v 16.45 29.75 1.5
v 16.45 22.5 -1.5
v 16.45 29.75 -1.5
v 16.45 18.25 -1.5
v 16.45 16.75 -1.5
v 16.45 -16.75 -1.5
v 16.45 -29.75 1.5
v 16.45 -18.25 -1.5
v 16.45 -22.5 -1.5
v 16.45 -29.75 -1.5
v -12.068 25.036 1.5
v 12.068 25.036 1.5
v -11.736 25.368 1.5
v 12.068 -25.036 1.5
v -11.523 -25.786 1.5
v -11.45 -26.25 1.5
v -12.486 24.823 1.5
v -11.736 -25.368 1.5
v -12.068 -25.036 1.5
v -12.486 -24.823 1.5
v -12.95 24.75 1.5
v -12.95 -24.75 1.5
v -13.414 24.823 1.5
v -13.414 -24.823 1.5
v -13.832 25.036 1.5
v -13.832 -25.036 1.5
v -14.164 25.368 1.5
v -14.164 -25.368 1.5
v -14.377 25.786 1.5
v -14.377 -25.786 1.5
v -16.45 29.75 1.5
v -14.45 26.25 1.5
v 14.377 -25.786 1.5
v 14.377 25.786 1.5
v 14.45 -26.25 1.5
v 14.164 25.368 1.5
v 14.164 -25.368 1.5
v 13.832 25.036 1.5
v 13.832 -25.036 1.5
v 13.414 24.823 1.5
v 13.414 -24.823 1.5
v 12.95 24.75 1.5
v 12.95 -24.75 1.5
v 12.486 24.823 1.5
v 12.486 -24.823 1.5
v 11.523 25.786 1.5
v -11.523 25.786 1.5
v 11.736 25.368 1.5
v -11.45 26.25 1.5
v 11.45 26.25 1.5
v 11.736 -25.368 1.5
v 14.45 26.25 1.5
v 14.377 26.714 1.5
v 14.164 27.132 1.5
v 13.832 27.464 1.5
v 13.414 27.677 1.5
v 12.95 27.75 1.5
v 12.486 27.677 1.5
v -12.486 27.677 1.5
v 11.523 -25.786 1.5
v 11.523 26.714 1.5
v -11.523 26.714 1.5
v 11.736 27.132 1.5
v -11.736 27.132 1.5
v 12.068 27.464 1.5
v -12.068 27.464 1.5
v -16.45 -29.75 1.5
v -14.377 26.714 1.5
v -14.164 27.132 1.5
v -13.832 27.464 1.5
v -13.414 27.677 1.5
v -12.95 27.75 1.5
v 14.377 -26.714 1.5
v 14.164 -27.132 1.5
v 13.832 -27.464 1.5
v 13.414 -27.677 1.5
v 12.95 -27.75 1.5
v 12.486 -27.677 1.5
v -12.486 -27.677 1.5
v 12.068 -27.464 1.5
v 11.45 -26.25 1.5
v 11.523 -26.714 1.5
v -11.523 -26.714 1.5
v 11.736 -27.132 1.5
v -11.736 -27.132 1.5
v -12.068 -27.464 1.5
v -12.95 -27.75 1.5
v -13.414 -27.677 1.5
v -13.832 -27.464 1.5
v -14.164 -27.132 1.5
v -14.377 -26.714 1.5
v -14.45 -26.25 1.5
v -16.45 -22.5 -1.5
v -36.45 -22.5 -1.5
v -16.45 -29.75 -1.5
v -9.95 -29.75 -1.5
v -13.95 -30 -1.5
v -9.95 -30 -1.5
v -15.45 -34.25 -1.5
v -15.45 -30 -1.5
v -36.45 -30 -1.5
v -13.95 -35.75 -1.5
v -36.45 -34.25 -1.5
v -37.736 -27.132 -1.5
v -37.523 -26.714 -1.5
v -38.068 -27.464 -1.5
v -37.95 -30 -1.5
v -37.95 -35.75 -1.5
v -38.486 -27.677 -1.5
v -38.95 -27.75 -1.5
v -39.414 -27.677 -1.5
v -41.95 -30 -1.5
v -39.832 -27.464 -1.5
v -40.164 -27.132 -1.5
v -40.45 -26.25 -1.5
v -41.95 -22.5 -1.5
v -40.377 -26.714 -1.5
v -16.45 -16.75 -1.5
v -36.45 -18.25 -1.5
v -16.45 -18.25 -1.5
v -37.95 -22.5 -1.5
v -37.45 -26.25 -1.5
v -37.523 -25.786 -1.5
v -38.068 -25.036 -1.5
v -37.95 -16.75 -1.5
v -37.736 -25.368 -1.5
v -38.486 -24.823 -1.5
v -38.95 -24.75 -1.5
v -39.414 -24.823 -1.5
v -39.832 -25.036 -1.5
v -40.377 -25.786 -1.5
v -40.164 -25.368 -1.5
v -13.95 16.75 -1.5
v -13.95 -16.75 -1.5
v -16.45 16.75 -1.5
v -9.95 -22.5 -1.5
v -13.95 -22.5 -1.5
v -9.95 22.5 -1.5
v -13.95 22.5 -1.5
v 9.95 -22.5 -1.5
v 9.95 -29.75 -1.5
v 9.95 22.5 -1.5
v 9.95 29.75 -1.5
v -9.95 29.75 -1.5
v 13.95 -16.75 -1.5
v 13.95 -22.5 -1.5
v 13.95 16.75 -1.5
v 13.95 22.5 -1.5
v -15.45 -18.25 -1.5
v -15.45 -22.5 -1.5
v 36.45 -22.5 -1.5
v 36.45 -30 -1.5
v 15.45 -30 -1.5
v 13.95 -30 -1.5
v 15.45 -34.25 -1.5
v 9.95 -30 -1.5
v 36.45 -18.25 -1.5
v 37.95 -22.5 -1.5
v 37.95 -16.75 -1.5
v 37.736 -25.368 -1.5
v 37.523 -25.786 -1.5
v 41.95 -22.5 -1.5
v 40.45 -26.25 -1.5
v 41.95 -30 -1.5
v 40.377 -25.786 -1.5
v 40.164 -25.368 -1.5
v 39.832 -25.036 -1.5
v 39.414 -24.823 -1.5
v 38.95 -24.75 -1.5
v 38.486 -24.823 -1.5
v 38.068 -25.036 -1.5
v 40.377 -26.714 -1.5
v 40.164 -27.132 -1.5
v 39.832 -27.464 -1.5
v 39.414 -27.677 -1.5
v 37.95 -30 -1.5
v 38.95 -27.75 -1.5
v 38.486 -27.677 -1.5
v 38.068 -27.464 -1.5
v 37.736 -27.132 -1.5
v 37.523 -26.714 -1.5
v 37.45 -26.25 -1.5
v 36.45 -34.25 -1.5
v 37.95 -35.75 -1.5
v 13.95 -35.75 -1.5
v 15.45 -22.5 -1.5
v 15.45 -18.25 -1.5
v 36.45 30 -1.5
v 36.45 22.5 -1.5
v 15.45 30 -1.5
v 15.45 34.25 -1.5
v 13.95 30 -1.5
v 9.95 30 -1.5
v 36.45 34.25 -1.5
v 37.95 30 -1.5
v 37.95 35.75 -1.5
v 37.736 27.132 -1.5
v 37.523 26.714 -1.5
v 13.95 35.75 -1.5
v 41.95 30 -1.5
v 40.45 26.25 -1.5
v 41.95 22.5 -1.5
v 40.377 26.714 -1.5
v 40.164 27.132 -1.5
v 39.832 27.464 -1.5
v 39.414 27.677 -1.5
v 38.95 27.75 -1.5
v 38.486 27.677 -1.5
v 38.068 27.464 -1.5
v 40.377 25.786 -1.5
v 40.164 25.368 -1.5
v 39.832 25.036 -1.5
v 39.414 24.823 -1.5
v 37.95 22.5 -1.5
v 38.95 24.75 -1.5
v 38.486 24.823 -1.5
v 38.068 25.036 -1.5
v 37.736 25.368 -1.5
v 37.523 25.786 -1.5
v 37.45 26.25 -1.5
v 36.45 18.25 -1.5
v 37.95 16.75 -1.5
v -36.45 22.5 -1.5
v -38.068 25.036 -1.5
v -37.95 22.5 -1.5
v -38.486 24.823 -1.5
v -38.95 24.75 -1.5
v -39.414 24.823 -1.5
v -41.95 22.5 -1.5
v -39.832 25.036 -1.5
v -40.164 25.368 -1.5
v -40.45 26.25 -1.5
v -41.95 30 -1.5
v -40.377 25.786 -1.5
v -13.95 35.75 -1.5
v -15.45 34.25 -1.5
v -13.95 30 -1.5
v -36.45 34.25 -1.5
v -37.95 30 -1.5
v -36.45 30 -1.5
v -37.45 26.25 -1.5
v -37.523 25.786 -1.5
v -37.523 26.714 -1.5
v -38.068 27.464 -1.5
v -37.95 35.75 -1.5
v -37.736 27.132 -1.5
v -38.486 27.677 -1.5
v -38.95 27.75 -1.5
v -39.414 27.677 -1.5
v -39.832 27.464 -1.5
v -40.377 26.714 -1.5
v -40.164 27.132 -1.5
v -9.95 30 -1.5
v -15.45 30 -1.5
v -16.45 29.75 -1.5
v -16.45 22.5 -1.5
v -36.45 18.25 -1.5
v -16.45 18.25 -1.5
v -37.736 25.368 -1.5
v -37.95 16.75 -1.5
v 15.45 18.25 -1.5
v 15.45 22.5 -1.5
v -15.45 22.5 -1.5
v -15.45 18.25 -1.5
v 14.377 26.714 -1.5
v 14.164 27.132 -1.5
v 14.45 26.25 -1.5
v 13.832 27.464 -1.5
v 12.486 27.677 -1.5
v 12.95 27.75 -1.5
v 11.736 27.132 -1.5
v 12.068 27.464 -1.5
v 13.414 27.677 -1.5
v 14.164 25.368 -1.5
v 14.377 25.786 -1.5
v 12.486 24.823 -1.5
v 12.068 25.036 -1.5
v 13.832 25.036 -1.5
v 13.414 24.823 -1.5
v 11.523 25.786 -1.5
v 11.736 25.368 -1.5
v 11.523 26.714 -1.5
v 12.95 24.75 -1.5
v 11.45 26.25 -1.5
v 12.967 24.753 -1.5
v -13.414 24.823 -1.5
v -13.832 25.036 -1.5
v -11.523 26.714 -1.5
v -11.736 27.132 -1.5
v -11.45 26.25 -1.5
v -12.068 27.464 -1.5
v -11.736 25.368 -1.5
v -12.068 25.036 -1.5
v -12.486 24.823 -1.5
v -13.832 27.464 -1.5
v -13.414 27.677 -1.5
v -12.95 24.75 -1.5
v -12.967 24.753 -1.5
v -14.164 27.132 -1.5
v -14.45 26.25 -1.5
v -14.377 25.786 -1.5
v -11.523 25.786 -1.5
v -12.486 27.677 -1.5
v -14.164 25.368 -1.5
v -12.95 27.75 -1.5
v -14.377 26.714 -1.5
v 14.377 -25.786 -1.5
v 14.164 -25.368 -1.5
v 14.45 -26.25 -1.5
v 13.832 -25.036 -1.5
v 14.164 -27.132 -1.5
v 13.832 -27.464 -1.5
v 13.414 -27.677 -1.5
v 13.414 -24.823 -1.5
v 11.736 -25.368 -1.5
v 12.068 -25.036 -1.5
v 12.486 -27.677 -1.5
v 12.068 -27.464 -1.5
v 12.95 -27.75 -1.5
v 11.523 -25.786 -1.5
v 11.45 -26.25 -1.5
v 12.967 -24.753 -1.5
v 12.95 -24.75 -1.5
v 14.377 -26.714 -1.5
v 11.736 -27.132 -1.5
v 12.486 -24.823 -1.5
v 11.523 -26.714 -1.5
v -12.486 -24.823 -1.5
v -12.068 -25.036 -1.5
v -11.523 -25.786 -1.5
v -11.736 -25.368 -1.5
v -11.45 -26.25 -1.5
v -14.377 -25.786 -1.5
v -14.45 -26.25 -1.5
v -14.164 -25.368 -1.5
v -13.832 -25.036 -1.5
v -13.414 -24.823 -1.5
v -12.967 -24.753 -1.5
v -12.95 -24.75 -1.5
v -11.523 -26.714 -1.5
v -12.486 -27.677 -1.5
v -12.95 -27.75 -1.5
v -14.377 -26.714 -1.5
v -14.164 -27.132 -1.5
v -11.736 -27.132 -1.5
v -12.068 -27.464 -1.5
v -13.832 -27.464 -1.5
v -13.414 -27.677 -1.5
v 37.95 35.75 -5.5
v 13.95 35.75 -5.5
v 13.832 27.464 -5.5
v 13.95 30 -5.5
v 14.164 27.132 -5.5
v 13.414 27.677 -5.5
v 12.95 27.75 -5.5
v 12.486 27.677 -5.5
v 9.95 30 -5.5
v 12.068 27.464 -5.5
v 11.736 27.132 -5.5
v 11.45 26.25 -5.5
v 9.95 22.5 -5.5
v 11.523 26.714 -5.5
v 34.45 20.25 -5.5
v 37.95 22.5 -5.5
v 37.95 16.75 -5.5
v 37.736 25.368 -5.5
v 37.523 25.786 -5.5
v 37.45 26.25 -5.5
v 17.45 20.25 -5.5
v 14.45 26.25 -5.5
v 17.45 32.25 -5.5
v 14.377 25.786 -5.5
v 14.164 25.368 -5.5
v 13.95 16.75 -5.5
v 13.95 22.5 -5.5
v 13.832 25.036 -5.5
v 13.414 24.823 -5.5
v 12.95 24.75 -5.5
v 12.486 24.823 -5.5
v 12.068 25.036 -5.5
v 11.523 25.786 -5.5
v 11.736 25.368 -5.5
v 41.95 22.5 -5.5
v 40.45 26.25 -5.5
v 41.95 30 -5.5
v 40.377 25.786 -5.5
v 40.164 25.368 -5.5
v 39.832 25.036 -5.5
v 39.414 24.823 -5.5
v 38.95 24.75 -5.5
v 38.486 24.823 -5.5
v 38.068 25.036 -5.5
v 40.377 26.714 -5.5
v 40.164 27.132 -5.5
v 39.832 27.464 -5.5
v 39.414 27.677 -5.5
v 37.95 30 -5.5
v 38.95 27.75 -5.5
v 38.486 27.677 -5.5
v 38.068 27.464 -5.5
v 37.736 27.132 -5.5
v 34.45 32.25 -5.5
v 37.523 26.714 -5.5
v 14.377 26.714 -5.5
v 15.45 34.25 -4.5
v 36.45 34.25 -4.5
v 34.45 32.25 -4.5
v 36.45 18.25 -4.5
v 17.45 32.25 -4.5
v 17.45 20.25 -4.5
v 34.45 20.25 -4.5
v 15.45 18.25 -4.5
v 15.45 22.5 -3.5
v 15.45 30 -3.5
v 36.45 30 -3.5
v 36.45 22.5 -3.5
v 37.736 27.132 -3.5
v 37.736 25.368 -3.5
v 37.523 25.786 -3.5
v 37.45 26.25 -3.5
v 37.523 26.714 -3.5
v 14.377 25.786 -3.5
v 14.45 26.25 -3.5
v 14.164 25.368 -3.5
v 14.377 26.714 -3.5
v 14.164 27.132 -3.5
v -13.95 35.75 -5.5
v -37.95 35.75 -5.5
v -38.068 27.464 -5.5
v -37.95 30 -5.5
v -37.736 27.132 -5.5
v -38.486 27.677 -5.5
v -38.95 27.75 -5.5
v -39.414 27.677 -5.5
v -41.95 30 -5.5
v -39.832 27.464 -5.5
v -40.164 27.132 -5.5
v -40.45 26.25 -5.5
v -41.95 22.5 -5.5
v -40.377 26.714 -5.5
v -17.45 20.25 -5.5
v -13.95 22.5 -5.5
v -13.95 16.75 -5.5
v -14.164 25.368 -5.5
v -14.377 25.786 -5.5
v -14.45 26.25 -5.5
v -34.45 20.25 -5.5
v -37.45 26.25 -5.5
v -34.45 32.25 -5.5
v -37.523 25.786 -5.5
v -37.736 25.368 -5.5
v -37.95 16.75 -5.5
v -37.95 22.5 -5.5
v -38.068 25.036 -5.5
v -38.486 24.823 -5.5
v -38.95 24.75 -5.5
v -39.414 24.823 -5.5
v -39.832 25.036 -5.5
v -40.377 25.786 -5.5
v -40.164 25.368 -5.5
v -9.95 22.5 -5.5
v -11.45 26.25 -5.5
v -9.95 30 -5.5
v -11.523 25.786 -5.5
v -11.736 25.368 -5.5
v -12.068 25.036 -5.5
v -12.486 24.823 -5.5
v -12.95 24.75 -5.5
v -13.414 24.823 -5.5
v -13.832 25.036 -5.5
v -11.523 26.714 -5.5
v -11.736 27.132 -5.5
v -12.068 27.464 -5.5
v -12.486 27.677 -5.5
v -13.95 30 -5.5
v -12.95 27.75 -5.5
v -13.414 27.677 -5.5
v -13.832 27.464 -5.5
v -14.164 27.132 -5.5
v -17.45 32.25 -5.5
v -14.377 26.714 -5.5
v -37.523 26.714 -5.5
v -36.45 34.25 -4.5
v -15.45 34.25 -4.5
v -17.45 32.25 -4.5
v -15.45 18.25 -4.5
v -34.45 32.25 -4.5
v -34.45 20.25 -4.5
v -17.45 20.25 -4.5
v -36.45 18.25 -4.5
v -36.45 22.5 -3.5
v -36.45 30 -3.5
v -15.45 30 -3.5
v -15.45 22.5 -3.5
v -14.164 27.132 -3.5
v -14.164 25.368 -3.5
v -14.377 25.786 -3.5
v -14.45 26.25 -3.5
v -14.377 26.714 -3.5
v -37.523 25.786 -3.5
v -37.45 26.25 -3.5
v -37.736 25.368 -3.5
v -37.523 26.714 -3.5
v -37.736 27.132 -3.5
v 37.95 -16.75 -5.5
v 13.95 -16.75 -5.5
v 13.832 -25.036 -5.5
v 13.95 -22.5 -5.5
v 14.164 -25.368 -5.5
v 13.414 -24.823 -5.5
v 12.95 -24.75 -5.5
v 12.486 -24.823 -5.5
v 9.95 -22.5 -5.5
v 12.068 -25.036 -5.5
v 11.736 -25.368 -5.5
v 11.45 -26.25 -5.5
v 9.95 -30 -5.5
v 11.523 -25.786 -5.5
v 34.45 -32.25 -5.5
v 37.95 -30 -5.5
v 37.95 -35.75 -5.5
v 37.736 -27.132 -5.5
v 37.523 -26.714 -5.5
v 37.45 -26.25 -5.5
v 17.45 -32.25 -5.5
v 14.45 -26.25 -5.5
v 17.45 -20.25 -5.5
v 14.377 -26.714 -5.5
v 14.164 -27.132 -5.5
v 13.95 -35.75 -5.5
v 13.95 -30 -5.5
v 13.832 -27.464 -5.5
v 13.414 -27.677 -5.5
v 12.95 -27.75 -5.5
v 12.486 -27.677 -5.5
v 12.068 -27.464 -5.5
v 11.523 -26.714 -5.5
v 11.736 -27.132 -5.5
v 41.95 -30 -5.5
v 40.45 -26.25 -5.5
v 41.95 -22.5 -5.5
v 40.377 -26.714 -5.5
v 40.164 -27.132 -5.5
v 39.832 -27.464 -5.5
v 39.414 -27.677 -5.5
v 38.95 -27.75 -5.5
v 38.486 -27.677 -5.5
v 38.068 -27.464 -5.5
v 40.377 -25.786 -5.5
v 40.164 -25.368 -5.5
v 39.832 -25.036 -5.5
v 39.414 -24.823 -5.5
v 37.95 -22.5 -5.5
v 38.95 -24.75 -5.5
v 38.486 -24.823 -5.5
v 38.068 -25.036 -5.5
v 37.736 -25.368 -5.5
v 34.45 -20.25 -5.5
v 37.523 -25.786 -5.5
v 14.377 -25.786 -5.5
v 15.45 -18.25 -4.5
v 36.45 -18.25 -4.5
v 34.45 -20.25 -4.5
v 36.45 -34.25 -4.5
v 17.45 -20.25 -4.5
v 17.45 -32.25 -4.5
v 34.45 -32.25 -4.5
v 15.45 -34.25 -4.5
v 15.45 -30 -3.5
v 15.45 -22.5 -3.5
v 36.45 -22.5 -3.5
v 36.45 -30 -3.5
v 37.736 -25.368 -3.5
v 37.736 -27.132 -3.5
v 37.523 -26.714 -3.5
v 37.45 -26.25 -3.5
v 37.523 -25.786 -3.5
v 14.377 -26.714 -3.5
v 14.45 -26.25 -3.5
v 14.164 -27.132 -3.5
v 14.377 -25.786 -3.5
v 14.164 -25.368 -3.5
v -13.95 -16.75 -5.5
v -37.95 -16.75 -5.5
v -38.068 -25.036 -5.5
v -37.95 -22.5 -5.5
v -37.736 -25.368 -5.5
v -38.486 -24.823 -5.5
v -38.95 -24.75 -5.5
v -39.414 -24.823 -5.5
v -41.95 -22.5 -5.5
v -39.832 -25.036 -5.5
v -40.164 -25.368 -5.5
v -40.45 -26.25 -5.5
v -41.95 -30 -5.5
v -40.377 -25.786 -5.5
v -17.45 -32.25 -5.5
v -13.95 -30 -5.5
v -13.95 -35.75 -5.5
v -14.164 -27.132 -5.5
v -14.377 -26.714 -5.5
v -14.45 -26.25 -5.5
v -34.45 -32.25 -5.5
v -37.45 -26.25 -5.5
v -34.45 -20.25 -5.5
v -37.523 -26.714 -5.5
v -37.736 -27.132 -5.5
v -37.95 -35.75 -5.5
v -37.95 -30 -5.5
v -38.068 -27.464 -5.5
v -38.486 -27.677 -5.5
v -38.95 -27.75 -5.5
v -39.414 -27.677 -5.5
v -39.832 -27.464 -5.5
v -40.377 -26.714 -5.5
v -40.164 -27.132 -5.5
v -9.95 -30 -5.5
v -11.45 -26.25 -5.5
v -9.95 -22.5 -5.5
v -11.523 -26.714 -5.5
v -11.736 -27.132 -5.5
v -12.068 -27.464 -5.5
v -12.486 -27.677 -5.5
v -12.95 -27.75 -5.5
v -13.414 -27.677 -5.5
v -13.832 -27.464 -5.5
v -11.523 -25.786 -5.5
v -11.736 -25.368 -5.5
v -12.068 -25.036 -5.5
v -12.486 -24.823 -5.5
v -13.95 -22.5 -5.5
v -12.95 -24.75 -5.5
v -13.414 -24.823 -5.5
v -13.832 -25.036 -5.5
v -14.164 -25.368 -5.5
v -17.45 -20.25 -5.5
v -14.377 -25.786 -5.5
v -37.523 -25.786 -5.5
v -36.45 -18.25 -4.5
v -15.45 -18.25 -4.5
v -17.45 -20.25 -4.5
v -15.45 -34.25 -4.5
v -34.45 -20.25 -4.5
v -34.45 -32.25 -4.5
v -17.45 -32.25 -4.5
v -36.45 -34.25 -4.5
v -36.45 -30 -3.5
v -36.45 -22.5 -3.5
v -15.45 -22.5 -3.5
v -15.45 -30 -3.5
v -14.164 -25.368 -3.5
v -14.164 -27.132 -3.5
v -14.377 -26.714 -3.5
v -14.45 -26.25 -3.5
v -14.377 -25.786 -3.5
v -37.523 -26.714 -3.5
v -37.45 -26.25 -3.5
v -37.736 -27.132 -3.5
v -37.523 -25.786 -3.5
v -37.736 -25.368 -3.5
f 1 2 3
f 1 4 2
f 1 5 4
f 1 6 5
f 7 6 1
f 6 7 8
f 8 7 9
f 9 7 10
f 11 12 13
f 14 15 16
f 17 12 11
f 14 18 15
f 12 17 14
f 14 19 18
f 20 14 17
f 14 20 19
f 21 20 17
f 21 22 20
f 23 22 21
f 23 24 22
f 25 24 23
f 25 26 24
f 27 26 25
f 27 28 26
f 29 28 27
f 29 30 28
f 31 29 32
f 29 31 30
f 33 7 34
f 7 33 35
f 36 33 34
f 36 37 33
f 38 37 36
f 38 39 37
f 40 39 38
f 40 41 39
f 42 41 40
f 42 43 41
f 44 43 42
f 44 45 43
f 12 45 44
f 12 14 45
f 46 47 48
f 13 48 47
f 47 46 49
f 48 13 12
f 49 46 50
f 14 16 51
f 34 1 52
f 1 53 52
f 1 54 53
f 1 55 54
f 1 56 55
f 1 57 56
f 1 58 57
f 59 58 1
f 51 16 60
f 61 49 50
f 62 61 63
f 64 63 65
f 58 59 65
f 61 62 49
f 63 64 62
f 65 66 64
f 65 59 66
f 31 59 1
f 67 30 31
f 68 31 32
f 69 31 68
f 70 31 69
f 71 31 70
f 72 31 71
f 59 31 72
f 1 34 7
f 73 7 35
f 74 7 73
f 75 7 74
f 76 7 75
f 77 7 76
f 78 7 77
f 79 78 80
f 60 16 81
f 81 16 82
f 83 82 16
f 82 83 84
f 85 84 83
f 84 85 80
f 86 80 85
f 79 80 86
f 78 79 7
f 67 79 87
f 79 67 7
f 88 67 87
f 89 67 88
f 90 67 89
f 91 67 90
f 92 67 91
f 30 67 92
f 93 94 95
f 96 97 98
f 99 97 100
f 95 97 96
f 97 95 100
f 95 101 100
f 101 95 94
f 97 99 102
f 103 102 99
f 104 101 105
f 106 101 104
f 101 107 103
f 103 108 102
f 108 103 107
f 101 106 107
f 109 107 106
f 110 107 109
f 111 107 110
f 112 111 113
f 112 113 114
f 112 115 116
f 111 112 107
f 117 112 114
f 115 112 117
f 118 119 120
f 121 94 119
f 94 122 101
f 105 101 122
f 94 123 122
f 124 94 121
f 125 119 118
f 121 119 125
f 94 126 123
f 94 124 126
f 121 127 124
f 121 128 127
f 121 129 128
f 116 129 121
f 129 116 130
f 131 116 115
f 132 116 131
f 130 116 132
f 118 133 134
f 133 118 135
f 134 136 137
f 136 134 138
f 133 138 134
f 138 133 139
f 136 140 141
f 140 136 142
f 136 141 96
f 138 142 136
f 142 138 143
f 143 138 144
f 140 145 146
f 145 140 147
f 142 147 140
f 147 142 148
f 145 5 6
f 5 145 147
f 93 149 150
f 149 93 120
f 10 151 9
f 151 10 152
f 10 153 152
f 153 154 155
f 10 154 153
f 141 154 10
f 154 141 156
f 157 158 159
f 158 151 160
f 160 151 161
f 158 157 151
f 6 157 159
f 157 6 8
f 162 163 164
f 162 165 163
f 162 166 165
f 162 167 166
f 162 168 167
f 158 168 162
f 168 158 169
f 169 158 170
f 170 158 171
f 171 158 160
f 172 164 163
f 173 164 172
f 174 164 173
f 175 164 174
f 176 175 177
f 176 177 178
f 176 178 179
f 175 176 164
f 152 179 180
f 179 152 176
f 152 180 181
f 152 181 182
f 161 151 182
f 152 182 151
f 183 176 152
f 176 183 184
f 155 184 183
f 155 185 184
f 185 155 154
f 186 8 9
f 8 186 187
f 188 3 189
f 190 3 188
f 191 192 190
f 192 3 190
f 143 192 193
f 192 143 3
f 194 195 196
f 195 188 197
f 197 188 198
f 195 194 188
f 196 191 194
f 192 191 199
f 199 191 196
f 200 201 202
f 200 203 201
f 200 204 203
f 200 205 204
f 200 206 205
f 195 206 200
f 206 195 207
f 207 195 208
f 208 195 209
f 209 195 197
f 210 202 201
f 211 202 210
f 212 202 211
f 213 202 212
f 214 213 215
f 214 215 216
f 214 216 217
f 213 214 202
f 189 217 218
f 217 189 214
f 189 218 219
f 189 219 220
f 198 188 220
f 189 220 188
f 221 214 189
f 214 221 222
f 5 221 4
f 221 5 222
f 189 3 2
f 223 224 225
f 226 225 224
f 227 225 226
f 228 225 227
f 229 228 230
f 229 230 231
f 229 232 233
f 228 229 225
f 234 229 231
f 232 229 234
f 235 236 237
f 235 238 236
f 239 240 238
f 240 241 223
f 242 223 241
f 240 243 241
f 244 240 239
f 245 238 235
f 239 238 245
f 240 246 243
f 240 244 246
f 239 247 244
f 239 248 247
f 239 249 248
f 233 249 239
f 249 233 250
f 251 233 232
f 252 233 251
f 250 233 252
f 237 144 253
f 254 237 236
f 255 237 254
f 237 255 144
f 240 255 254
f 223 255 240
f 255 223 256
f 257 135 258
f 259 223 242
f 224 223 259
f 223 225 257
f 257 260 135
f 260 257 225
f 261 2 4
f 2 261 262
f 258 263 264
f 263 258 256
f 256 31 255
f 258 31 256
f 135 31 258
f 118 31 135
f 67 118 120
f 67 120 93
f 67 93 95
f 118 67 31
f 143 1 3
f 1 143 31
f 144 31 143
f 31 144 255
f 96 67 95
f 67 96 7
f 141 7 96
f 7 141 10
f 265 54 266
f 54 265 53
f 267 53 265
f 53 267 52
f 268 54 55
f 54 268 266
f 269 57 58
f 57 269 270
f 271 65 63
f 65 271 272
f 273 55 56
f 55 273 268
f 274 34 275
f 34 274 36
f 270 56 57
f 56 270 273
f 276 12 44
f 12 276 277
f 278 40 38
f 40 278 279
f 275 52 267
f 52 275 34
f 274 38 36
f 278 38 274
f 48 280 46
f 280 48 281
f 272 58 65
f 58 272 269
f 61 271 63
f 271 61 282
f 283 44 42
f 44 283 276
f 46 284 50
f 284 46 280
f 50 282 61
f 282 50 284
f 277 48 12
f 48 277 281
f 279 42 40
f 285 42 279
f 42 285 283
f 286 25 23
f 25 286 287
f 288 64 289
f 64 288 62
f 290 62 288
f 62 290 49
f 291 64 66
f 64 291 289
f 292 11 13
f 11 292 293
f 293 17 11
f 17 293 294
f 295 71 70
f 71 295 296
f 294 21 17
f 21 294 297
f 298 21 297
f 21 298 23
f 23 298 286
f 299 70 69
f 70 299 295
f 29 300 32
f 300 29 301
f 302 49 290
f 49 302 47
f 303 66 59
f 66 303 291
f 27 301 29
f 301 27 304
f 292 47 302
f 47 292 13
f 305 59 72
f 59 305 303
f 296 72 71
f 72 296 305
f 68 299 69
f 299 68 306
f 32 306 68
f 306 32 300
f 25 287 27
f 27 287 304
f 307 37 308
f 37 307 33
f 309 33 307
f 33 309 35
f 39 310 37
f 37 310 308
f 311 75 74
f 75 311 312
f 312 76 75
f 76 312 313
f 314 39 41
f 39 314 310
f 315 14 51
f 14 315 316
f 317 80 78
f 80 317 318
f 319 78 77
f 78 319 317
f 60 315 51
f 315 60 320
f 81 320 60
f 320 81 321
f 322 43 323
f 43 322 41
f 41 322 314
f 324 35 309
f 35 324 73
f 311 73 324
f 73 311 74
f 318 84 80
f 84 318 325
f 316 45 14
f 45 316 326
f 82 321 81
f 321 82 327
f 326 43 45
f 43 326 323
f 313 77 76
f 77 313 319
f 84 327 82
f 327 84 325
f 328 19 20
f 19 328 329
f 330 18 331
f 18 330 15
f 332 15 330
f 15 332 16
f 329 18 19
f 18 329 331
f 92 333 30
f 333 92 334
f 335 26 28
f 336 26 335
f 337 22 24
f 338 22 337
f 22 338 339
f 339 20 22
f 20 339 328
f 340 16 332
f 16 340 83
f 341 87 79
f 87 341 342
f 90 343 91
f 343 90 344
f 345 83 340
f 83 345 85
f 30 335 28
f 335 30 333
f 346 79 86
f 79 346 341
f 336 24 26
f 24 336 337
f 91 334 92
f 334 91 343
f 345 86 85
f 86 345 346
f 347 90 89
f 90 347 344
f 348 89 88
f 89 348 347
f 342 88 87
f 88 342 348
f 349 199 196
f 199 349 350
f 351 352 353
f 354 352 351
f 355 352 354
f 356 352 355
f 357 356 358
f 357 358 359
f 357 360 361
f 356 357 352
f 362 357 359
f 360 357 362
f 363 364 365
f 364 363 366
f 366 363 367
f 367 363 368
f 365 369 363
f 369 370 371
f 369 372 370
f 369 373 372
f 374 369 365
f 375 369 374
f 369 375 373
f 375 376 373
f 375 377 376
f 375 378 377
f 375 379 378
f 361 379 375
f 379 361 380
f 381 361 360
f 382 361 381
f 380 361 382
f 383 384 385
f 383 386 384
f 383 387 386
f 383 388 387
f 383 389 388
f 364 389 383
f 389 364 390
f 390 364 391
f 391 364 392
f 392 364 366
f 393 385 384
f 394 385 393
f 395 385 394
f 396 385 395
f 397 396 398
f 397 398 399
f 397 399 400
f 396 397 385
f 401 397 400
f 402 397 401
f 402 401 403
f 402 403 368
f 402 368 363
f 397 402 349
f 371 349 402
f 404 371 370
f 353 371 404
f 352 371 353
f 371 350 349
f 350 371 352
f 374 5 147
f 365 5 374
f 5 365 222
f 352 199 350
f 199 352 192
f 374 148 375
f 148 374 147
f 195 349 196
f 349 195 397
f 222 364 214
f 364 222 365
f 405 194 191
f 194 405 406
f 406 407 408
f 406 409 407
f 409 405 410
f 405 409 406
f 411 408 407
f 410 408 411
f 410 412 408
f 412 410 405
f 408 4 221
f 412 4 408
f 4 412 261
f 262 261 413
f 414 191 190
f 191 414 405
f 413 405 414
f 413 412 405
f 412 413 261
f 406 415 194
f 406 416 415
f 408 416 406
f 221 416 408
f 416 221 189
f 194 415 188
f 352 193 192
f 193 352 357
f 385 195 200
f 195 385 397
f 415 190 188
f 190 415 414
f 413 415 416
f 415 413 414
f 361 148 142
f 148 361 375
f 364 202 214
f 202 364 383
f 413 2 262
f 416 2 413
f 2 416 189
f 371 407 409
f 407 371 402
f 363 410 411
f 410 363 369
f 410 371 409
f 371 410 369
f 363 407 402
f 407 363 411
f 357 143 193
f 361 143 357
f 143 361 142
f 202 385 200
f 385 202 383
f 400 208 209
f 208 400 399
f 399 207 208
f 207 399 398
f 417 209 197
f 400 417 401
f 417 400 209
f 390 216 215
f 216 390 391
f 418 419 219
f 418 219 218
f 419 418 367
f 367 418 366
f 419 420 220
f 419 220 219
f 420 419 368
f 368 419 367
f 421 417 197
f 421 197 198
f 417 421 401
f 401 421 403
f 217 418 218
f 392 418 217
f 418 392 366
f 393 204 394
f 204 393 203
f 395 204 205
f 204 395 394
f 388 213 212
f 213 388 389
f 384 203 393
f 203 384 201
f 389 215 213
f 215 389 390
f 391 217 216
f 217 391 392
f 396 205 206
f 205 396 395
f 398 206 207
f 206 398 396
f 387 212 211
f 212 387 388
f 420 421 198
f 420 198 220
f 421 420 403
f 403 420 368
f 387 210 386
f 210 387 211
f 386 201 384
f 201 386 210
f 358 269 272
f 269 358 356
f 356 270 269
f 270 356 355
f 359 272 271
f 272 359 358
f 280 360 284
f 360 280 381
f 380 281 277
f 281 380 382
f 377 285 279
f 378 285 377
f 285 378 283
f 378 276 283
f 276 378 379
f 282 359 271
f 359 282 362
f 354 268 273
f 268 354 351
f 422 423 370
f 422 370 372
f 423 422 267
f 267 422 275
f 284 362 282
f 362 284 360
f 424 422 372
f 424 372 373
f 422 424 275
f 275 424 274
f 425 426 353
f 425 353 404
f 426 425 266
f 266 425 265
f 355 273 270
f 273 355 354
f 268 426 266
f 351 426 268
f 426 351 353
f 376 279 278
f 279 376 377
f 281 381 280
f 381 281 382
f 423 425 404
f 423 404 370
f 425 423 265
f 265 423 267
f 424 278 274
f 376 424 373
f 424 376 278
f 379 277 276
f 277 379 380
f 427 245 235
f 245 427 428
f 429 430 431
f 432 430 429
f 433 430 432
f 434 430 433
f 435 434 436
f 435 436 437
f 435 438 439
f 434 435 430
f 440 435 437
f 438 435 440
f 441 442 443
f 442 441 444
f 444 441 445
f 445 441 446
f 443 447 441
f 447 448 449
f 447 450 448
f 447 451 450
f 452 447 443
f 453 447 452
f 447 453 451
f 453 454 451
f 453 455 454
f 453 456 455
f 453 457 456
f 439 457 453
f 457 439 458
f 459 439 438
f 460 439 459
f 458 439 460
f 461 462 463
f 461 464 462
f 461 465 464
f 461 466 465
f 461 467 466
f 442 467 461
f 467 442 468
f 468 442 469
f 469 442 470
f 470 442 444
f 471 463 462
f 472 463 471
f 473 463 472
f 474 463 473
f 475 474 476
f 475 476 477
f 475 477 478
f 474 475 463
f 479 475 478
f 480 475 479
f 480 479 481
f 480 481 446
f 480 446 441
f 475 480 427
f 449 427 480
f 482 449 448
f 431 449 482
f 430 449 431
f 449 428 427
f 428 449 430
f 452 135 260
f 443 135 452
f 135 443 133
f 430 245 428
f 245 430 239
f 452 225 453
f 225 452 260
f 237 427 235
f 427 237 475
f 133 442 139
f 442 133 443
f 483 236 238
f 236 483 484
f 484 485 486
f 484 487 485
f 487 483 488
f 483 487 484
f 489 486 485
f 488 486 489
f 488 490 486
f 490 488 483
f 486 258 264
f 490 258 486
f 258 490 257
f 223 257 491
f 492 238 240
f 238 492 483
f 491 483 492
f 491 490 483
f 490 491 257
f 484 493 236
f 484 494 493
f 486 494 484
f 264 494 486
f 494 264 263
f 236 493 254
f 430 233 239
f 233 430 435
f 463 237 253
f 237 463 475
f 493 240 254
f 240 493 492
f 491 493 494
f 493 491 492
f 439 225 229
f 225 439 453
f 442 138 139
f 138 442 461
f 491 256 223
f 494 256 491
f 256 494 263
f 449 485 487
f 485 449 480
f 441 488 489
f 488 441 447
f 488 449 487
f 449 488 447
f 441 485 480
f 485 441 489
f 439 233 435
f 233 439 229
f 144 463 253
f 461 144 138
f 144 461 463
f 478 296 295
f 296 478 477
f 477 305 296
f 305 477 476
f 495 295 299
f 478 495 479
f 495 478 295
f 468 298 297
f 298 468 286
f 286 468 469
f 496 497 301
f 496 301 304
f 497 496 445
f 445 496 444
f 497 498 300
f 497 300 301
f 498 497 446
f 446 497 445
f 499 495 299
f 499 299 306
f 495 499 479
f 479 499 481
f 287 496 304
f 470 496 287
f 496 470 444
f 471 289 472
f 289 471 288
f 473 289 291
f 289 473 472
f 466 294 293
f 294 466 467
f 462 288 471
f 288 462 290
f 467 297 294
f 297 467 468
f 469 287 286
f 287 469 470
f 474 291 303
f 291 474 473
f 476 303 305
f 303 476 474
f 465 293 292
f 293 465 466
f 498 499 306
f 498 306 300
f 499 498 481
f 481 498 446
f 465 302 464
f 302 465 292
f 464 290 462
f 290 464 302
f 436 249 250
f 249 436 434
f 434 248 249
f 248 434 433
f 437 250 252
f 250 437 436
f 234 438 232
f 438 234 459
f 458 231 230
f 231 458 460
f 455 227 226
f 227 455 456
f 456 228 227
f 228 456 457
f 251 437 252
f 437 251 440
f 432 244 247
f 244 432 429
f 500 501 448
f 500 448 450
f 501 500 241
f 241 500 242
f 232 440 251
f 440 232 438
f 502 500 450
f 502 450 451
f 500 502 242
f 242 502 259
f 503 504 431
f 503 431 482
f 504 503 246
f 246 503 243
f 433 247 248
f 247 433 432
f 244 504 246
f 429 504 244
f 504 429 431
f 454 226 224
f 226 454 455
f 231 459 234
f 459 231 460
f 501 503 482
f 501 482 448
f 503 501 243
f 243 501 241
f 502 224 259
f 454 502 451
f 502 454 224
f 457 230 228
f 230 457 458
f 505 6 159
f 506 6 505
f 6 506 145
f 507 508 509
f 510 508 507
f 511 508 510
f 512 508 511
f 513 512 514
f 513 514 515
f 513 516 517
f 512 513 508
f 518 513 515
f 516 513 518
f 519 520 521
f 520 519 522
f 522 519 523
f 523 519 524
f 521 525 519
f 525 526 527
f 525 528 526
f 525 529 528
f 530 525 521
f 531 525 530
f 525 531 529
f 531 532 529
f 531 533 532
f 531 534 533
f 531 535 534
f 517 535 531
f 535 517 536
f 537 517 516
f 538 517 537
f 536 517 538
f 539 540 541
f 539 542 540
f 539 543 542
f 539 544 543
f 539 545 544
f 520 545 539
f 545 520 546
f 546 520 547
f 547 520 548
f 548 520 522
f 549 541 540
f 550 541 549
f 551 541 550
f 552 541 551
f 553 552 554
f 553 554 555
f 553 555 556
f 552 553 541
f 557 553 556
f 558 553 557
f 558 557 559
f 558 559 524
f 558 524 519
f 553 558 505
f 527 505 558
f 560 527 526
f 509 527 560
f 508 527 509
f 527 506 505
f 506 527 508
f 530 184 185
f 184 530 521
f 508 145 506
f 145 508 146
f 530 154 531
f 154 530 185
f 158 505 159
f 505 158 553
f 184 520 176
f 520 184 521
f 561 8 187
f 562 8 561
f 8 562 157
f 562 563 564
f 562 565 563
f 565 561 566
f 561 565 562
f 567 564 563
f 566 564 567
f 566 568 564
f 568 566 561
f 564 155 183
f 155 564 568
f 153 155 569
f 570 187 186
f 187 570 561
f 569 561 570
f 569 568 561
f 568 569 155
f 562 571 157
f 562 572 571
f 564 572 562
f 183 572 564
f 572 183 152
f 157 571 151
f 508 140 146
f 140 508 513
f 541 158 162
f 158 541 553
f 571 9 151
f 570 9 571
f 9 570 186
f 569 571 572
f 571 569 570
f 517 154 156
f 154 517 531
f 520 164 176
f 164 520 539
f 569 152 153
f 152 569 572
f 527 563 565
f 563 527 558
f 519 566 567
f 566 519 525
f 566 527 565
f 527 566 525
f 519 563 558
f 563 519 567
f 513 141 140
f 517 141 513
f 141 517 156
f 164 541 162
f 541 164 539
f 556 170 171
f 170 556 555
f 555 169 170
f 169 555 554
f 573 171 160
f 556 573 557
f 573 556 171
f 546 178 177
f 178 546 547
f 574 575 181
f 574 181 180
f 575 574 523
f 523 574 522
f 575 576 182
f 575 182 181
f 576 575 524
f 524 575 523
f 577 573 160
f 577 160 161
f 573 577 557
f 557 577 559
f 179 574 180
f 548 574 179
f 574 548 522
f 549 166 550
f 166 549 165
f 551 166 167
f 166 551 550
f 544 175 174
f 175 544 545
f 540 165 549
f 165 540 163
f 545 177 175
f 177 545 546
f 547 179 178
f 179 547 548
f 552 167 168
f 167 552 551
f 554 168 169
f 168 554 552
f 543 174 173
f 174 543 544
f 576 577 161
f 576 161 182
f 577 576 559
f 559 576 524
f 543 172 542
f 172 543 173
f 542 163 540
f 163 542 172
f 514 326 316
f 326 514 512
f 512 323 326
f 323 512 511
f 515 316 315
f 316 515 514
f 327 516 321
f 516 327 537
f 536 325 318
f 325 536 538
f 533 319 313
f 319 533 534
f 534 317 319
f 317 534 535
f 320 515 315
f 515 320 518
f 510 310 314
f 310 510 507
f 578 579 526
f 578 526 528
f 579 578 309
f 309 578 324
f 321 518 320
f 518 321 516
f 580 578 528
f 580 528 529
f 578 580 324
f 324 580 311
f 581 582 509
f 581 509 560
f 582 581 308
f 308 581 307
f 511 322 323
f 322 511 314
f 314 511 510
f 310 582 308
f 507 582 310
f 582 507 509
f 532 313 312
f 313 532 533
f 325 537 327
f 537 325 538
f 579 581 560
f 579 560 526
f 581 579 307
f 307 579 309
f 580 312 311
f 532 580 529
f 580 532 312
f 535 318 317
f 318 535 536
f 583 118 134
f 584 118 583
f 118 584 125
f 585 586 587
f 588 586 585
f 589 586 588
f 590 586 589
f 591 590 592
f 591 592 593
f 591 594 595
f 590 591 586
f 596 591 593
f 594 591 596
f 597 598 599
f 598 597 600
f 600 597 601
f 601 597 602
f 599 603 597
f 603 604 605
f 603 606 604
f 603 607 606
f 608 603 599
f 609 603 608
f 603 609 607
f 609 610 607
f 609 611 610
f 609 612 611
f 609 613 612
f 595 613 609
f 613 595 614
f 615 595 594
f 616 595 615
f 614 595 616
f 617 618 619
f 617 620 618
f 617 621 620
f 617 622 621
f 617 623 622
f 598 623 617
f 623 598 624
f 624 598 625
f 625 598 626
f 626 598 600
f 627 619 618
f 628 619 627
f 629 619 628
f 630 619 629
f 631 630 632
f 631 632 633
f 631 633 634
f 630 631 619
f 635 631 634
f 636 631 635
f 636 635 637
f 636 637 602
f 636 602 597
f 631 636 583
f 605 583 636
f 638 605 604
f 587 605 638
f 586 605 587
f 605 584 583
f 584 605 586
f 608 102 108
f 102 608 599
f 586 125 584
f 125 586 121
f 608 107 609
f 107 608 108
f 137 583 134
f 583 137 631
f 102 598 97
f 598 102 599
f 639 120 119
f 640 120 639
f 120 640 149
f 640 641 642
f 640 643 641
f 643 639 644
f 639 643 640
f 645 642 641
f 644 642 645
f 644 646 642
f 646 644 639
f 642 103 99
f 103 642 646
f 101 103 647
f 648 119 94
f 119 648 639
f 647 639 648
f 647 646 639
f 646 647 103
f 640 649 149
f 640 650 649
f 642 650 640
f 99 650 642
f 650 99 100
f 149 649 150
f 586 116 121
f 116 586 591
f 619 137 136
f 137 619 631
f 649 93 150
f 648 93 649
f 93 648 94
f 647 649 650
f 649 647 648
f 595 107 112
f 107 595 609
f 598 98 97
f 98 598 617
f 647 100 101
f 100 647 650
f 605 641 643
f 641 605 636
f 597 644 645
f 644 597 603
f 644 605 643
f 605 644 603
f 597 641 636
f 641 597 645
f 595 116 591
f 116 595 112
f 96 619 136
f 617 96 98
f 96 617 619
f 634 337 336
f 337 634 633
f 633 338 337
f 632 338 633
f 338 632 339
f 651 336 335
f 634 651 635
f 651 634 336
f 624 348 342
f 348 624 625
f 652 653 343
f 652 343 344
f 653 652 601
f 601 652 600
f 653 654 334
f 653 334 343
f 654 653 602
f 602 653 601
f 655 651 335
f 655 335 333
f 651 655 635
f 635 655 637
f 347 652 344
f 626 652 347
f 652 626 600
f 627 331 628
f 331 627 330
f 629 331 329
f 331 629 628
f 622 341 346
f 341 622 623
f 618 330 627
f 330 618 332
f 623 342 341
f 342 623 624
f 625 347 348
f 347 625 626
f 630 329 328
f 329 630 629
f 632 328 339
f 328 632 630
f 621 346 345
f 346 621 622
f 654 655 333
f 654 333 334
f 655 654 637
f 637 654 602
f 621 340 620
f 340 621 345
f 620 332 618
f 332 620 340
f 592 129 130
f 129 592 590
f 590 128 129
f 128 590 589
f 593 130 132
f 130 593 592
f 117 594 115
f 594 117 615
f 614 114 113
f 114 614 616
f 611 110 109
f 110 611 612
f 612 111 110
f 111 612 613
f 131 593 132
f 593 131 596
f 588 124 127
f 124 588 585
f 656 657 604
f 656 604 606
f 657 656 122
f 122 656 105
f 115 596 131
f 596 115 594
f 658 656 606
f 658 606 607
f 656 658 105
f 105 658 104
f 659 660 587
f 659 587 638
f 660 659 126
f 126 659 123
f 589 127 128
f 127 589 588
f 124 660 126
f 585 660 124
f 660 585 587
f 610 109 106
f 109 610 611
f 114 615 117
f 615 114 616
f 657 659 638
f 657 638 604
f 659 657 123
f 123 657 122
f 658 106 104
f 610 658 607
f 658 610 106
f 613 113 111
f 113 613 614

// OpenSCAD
xarduino=30.9;
yarduino=57.5;
xdriver=15;
ydriver=20;
xstepdown=26;
ystepdown=43.5;
forat=1.5;

module arduino(){
    difference(){
        cube([xarduino+2,yarduino+2,3],center=true);
        translate([(xarduino/2-1-forat),(yarduino/2-1-forat),0])
        cylinder(r=forat,h=4,$fn=20,center=true);
        translate([-(xarduino/2-1-forat),(yarduino/2-1-forat),0])
        cylinder(r=forat,h=4,$fn=20,center=true);
        translate([(xarduino/2-1-forat),-(yarduino/2-1-forat),0])
        cylinder(r=forat,h=4,$fn=20,center=true);
        translate([-(xarduino/2-1-forat),-(yarduino/2-1-forat),0])
        cylinder(r=forat,h=4,$fn=20,center=true);
    } 
}
module driver(){
    difference(){
        union(){
            difference(){
                cube([xdriver+4,ydriver+4,4],center=true);
                translate([0,0,1])
                cube([xdriver+1,ydriver+1,4],center=true);
                translate([0,0,2])
                cube([xdriver/2,ydriver+6,4],center=true);
                translate([0,0,-2])
                cube([xdriver-3,ydriver-3,4],center=true);
            }
            translate([0,ydriver/2+ydriver/5,-1])
            cube([xdriver/2,ydriver/5,2],center=true);
            translate([0,-(ydriver/2+ydriver/5),-1])
            cube([xdriver/2,ydriver/5,2],center=true);
        }
        translate([0,-(ydriver/2+3),0])
        cylinder(r=forat,h=10,center=true,$fn=20);
        translate([0,(ydriver/2+3),0])
        cylinder(r=forat,h=10,center=true,$fn=20);
    }
}
module driver_t(){
    difference(){
                cube([xdriver/2,ydriver+4+2*ydriver/5,2],center=true);
                translate([0,-(ydriver/2+3),0])
                cylinder(r=forat,h=10,center=true,$fn=20);
                translate([0,(ydriver/2+3),0])
                cylinder(r=forat,h=10,center=true,$fn=20);
        }
    
}
module p_driver(){
    driver();
    translate([0,0,1])
    driver_t();
}

module step(){
    difference(){
        cube([xstepdown+2,ystepdown+2,3],center=true);
        translate([(xstepdown/2-2.5-forat),(ystepdown/2-6.5-forat),0])
        cylinder(r=forat,h=4,$fn=20,center=true);
        translate([-(xstepdown/2-7.5-forat),-(ystepdown/2-6.5-forat),0])
        cylinder(r=forat,h=4,$fn=20,center=true);
    } 
}
module sup_montat(){
    arduino();
    translate([xarduino/2+xdriver/2+3,yarduino/2-1-forat,-3.5])
    rotate([0,0,90])
    p_driver();
    translate([-(xarduino/2+xdriver/2+3),yarduino/2-1-forat,-3.5])
    rotate([0,0,90])
    p_driver();
    translate([xarduino/2+xdriver/2+3,-(yarduino/2-1-forat),-3.5])
    rotate([0,0,90])
    p_driver();
    translate([-(xarduino/2+xdriver/2+3),-(yarduino/2-1-forat),-3.5])
    rotate([0,0,90])
    p_driver();
    
}
sup_montat();
